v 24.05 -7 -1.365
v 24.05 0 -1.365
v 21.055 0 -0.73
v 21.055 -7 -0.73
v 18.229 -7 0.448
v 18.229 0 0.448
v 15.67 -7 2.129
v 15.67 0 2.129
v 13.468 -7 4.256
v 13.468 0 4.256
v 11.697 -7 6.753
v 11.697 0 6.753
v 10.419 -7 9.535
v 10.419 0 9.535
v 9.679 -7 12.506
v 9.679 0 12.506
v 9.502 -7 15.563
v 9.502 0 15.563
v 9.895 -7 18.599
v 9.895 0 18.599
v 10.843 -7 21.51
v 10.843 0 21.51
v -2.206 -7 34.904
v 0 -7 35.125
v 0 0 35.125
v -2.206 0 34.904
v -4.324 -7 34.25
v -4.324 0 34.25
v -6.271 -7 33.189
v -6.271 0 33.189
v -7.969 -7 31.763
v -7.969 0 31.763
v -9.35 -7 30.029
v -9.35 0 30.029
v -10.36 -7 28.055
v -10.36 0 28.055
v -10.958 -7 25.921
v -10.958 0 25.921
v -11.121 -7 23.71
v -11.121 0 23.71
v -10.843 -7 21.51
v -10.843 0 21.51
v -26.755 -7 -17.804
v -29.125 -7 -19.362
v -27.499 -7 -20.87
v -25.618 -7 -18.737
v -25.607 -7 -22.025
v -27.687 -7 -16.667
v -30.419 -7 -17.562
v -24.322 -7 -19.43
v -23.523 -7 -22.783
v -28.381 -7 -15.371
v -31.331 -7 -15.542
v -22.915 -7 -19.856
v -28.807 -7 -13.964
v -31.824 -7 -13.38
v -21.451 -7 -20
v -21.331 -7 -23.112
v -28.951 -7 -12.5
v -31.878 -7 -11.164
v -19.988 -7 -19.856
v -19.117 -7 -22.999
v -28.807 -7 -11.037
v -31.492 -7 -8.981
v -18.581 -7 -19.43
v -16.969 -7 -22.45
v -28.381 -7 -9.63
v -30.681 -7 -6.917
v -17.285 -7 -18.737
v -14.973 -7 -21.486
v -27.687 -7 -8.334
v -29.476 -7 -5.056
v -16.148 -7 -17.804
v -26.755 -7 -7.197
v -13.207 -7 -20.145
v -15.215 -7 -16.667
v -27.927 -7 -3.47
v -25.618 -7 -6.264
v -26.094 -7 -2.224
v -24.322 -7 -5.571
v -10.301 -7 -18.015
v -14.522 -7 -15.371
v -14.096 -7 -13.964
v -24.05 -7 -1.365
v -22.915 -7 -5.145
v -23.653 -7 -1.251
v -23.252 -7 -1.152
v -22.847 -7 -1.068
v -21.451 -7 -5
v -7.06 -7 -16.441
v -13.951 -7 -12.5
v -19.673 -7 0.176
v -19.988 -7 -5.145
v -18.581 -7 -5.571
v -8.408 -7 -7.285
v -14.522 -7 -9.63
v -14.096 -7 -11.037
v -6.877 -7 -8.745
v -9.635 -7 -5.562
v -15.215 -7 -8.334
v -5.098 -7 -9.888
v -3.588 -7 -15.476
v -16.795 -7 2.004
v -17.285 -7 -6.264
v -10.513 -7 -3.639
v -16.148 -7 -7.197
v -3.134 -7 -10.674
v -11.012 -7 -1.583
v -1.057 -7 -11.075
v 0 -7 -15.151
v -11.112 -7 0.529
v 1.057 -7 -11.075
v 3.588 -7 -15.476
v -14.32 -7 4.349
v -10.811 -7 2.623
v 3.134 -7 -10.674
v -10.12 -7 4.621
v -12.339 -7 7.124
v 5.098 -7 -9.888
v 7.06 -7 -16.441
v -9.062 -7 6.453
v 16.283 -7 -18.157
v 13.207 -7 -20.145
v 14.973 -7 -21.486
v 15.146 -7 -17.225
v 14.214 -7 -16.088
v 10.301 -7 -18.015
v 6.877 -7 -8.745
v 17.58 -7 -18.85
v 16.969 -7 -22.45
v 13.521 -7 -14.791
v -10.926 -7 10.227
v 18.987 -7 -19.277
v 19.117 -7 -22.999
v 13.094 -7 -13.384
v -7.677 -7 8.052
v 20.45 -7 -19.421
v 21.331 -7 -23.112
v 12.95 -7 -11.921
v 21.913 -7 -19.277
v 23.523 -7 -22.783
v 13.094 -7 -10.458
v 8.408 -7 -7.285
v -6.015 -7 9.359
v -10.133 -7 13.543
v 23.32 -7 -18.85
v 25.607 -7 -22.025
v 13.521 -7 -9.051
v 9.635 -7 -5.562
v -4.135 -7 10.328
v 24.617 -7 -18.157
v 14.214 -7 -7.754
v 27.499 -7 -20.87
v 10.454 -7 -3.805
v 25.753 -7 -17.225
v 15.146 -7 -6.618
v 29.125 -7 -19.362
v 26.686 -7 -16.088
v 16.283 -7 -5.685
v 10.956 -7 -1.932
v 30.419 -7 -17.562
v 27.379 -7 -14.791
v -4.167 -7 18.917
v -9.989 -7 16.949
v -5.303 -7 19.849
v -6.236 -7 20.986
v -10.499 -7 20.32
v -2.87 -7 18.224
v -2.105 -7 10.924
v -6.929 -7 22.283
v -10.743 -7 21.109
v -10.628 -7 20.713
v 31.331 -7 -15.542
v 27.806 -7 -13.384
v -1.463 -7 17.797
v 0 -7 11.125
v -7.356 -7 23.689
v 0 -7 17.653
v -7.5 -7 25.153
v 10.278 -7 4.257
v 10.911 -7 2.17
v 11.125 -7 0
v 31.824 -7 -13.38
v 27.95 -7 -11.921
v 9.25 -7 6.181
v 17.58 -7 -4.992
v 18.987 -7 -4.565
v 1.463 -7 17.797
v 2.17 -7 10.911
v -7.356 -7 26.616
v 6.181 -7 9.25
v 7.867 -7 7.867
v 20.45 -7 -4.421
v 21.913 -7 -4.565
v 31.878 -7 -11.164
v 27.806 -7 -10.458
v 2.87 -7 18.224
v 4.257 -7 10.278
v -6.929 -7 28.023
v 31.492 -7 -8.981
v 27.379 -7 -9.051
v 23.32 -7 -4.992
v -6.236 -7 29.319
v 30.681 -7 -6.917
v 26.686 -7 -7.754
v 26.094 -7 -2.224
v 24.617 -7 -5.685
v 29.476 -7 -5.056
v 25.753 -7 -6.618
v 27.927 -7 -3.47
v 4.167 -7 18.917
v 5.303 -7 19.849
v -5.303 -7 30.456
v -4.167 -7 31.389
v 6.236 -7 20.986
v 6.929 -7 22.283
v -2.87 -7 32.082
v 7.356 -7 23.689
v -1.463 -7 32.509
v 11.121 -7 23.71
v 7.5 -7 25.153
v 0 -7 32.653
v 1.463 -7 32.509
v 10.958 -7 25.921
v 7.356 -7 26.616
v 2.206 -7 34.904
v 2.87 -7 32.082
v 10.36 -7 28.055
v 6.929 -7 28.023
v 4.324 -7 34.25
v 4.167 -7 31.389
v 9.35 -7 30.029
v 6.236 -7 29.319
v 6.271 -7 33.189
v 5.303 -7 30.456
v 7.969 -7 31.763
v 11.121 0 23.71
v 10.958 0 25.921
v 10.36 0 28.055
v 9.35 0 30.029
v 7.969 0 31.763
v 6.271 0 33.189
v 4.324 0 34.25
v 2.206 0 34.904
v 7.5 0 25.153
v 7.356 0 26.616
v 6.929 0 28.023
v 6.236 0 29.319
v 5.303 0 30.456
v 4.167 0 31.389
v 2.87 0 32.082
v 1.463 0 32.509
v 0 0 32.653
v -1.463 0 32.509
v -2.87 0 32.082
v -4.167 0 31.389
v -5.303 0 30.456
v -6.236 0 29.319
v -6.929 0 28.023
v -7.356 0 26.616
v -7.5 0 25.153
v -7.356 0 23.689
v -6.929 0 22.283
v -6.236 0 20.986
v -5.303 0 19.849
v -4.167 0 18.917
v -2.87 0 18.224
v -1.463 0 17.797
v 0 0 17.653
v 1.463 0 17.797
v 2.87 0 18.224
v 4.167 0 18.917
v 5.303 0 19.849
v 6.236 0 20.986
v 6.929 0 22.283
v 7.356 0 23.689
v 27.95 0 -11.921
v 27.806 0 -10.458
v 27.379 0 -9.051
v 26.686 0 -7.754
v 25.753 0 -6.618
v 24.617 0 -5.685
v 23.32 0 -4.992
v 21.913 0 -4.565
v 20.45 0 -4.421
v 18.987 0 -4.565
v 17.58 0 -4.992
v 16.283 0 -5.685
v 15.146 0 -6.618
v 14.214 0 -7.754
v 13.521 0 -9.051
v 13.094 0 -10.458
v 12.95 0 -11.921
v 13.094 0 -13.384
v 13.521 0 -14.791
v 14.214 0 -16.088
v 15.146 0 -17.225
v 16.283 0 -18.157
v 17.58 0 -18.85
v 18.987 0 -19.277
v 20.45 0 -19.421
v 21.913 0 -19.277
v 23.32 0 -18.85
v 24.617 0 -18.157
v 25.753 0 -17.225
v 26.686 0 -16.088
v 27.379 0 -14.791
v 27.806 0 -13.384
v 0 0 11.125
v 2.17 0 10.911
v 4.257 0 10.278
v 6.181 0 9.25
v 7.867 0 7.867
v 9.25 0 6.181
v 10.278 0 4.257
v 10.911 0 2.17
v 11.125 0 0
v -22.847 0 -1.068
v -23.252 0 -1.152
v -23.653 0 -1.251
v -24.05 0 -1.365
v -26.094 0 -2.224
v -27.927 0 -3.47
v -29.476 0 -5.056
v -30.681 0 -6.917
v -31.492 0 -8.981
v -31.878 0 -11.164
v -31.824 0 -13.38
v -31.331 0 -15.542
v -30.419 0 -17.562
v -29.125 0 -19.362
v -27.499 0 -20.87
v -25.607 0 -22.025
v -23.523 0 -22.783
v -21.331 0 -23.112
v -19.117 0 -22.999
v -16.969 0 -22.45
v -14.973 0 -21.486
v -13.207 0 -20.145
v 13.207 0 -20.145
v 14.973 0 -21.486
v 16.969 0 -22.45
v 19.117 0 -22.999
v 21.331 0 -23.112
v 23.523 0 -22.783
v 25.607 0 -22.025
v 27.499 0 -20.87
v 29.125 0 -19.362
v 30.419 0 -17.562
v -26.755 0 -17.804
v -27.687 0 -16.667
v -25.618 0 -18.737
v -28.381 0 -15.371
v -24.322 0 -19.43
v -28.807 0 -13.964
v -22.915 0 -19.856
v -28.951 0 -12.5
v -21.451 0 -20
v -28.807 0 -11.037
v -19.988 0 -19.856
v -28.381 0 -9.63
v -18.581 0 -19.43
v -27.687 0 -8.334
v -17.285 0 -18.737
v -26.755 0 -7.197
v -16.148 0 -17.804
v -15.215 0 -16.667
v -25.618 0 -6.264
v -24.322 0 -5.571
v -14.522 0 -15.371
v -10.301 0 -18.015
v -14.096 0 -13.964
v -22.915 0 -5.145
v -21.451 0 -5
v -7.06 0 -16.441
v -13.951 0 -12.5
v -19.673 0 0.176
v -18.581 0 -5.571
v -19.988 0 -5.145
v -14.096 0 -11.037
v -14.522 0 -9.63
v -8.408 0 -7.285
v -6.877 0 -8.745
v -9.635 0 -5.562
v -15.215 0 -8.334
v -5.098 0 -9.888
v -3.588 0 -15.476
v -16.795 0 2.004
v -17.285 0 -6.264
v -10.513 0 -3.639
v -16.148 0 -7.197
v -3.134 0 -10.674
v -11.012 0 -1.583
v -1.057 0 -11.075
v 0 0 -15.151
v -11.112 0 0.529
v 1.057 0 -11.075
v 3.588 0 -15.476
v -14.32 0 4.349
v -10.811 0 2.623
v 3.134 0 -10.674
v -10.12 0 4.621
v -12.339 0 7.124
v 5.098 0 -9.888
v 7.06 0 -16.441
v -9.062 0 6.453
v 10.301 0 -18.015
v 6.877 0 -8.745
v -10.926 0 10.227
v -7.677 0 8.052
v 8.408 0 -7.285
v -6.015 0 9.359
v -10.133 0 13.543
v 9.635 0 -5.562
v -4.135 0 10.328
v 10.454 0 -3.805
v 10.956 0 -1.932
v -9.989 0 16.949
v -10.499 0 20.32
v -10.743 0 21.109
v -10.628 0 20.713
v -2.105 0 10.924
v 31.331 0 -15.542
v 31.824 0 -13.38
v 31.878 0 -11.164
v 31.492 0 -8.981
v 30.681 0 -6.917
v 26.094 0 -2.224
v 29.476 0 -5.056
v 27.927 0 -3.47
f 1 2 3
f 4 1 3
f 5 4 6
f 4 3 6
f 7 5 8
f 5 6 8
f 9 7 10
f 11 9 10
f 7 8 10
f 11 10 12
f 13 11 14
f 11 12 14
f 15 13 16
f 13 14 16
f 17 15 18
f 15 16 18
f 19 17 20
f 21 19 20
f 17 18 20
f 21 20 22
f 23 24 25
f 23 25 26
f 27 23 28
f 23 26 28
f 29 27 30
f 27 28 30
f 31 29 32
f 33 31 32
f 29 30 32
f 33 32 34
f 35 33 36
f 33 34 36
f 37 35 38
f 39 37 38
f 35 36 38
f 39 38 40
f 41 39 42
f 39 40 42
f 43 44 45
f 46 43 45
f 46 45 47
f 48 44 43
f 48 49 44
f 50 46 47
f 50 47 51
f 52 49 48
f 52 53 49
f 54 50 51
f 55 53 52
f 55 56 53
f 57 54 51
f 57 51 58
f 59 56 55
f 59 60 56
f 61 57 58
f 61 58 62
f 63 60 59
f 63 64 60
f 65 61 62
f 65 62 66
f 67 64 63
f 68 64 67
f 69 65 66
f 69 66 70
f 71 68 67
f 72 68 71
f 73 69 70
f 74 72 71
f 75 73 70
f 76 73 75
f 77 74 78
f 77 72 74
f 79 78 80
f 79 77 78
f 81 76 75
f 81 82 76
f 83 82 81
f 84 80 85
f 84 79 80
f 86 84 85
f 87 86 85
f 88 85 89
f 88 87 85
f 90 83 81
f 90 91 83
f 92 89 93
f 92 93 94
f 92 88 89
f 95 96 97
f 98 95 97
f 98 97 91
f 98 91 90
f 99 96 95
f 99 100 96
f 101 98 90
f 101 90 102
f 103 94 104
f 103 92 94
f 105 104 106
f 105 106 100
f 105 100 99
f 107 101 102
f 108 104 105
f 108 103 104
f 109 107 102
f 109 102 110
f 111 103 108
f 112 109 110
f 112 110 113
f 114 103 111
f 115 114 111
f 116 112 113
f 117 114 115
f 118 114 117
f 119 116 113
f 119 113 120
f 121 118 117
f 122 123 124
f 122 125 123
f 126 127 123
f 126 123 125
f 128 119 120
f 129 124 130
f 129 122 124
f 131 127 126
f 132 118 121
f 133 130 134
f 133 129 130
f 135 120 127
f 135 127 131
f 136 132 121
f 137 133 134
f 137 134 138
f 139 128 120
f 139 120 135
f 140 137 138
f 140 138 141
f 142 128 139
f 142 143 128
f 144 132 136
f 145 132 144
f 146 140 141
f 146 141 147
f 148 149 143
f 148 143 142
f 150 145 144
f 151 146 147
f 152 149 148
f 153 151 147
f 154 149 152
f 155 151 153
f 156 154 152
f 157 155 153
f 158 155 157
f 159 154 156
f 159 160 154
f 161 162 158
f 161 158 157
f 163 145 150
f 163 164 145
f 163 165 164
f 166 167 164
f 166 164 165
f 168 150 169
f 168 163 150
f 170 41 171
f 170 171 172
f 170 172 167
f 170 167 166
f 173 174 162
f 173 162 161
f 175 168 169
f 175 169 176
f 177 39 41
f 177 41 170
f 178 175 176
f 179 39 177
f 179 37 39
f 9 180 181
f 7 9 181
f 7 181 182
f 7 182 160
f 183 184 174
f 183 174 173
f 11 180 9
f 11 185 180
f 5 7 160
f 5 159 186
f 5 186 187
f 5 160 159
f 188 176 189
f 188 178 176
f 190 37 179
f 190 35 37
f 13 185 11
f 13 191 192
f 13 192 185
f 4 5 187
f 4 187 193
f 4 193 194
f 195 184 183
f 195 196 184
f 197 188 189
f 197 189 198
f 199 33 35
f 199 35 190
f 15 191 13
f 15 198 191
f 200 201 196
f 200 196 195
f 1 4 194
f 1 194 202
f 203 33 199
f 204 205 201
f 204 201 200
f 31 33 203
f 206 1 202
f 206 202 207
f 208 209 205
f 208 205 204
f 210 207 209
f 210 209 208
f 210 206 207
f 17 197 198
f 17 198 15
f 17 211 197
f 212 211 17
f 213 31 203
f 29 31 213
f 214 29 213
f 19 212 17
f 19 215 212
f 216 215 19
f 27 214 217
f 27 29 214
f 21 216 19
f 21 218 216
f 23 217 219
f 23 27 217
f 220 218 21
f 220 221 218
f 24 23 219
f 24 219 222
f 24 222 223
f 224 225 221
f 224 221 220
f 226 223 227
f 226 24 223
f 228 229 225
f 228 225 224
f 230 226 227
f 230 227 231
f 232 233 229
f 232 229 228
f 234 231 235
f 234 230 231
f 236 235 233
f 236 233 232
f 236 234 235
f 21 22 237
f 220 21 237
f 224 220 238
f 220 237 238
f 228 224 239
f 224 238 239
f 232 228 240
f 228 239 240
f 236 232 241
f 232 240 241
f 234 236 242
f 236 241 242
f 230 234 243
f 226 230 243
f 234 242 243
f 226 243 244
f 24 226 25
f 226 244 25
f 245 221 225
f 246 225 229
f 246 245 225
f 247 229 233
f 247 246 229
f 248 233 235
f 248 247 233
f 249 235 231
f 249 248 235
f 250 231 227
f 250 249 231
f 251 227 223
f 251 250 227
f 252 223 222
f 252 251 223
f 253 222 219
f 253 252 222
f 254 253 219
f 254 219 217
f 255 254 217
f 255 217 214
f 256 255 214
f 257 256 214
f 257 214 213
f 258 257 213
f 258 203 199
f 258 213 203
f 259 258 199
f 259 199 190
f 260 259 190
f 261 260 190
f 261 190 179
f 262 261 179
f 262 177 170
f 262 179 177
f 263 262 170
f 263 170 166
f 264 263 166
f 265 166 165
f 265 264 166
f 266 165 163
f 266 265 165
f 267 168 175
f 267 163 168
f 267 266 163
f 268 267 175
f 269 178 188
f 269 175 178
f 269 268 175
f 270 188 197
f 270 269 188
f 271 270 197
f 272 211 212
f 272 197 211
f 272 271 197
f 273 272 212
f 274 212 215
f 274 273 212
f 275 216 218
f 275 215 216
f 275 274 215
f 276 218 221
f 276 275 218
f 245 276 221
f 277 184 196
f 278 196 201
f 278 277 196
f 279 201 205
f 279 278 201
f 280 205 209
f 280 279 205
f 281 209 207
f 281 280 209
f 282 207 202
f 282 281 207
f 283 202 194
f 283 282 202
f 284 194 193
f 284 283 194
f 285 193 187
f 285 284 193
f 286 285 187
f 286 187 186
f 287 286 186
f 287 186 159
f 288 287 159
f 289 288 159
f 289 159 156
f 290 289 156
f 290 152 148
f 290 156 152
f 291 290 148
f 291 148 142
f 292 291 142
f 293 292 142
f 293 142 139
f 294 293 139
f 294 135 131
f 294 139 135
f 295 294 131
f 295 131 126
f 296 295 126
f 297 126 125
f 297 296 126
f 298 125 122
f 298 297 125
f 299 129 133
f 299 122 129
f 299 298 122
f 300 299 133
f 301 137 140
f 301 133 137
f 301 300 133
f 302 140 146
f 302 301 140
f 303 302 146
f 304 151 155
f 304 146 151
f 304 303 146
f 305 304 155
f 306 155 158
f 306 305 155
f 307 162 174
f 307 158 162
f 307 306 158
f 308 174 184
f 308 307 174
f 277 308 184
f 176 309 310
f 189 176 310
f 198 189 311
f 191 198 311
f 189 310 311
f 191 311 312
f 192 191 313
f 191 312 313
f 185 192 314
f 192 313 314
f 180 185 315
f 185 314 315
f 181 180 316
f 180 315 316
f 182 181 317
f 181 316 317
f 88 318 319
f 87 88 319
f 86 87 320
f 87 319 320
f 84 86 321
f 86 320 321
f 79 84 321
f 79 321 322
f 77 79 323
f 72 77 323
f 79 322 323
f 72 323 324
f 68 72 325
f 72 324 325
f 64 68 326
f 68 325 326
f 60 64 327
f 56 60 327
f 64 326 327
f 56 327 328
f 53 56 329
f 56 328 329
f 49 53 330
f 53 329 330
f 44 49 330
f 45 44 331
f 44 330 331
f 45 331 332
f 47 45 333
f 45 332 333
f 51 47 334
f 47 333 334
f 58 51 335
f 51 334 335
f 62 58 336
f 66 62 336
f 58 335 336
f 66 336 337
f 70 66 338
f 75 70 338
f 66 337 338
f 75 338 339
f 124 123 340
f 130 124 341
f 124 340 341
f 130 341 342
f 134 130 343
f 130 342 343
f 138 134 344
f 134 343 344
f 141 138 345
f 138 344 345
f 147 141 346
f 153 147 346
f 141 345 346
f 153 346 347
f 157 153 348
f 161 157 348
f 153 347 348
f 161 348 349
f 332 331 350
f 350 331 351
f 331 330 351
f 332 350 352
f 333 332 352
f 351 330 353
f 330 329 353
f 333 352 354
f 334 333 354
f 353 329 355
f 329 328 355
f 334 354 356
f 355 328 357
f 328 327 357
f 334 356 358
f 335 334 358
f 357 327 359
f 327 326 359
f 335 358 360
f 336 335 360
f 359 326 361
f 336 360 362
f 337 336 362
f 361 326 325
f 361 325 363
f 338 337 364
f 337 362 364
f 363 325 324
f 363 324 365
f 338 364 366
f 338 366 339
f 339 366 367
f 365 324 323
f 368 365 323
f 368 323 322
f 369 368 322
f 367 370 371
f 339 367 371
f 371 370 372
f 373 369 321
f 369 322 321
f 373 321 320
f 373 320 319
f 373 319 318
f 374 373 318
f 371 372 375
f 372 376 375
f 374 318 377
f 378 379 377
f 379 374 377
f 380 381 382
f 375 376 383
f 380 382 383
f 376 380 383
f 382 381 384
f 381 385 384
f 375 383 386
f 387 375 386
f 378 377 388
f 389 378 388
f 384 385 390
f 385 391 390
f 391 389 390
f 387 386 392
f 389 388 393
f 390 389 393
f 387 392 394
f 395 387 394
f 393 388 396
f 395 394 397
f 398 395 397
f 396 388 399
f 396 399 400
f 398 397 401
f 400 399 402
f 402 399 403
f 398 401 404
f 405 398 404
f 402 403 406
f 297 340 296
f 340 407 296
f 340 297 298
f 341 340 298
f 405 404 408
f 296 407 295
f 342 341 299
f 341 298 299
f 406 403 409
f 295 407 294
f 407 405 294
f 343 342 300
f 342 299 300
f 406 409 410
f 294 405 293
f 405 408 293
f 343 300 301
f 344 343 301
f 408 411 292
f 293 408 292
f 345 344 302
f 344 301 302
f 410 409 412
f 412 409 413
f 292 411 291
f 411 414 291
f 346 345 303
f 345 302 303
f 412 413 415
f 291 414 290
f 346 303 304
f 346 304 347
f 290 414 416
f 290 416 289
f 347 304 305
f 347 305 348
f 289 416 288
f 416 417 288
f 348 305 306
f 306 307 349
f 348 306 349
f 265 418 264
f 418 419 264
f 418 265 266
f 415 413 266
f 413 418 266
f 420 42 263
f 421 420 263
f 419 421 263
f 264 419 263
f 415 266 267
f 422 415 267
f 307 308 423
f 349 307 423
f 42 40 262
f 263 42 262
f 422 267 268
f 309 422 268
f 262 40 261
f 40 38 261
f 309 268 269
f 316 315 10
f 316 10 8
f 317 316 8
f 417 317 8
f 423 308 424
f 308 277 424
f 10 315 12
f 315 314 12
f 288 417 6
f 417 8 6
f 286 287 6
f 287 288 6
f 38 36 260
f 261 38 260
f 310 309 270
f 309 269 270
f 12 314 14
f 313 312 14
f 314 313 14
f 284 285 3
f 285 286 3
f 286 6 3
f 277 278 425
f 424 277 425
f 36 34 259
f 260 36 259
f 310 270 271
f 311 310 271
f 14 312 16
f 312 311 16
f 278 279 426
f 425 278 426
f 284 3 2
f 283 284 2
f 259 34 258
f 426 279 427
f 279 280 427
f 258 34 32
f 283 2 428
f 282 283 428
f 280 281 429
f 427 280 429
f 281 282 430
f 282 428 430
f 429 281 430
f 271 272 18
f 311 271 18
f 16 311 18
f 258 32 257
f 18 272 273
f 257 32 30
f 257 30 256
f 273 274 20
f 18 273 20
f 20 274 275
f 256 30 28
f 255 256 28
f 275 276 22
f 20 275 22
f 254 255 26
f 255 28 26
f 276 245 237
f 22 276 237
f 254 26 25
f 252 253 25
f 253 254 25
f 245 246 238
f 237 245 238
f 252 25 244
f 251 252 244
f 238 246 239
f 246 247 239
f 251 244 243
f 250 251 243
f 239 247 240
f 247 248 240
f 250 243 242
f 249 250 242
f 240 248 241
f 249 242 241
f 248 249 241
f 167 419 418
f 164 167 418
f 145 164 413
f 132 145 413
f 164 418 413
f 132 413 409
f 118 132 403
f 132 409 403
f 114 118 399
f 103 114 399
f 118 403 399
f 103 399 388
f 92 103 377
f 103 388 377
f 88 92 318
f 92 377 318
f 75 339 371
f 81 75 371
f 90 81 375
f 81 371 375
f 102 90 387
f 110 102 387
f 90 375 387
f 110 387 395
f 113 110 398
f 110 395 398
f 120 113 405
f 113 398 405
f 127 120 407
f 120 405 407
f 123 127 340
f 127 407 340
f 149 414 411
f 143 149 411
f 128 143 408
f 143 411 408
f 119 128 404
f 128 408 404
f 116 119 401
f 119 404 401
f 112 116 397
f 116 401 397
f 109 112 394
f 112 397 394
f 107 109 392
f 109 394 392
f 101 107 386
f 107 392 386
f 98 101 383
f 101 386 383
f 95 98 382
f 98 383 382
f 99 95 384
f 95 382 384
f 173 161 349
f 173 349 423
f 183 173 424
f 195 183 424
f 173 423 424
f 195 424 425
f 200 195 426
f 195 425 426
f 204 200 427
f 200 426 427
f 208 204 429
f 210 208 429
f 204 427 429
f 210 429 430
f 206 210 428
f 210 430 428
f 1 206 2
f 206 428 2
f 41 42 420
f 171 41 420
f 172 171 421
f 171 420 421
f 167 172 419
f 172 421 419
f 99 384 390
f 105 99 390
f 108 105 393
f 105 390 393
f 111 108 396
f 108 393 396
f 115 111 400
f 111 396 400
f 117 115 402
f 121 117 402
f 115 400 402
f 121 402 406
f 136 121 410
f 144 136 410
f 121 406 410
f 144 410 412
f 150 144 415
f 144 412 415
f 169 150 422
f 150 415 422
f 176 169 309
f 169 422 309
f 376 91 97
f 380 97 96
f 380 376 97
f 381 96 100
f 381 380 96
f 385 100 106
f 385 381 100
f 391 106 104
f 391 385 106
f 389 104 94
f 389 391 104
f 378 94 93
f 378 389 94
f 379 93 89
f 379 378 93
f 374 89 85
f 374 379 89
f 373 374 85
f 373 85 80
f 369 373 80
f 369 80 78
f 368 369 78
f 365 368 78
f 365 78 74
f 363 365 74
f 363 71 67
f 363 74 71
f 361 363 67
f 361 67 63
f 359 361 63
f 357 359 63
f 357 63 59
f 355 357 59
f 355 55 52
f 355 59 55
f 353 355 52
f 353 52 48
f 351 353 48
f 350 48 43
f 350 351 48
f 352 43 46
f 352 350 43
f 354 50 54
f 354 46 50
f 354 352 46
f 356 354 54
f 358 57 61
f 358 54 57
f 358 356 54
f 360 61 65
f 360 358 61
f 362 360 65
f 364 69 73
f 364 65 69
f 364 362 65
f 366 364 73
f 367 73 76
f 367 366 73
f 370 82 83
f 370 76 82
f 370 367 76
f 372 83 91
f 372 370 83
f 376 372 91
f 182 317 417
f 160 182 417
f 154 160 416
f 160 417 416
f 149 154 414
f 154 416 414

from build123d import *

# Parameters (mm, degrees)
F1_DEPTH = 7
F2_R     = 7.5
F3_DEPTH = 47.6


with BuildPart() as f1:
    # F0 (on Front) → F1 (new body)
    with BuildSketch(Plane.XZ):
        with BuildLine():
            ThreePointArc((0, 11.125), (7.866563, 7.866563), (11.125, 0))
            ThreePointArc((11.125, 0), (10.745925, -2.879362), (9.634533, -5.5625))
            Line((9.634533, -5.5625), (30.419142, -17.5625))
            ThreePointArc((30.419142, -17.5625), (31.137901, -7.928761), (24.049755, -1.364942))
            ThreePointArc((24.049755, -1.364942), (11.696795, 6.753148), (10.842803, 21.51017))
            ThreePointArc((10.842803, 21.51017), (8.702442, 30.930594), (0, 35.125))
            Line((0, 35.125), (0, 11.125))
        make_face()
        with BuildLine():
            ThreePointArc((-9.634533, -5.5625), (-9.634533, 5.5625), (0, 11.125))
            Line((0, 11.125), (0, 35.125))
            ThreePointArc((0, 35.125), (-8.702442, 30.930594), (-10.842803, 21.51017))
            ThreePointArc((-10.842803, 21.51017), (-10.660456, 20.918313), (-10.498883, 20.32045))
            ThreePointArc((-10.498883, 20.32045), (-12.339117, 7.123992), (-22.847468, -1.067926))
            ThreePointArc((-22.847468, -1.067926), (-23.446018, -1.226931), (-24.049755, -1.364942))
            ThreePointArc((-24.049755, -1.364942), (-31.137901, -7.928761), (-30.419142, -17.5625))
            Line((-30.419142, -17.5625), (-9.634533, -5.5625))
        make_face()
        with BuildLine():
            Line((30.419142, -17.5625), (9.634533, -5.5625))
            ThreePointArc((9.634533, -5.5625), (0, -11.125), (-9.634533, -5.5625))
            Line((-9.634533, -5.5625), (-30.419142, -17.5625))
            ThreePointArc((-30.419142, -17.5625), (-22.435459, -23.001833), (-13.206952, -20.145228))
            ThreePointArc((-13.206952, -20.145228), (0, -15.150958), (13.206952, -20.145228))
            ThreePointArc((13.206952, -20.145228), (22.435459, -23.001833), (30.419142, -17.5625))
        make_face()
        with BuildLine():
            ThreePointArc((-10.498883, 20.32045), (-10.660456, 20.918313), (-10.842803, 21.51017))
            ThreePointArc((-10.842803, 21.51017), (-10.68741, 20.910521), (-10.498883, 20.32045))
        make_face()
        with BuildLine():
            ThreePointArc((-22.847468, -1.067926), (-23.452747, -1.199691), (-24.049755, -1.364942))
            ThreePointArc((-24.049755, -1.364942), (-23.446018, -1.226931), (-22.847468, -1.067926))
        make_face()
    extrude(amount=F1_DEPTH)

    # F2 (on Front) → F3 (cut)
    with BuildSketch(Plane.XZ):
        with Locations((20.449737, -11.921206)):
            Circle(F2_R)
        with Locations((-21.451427, -12.500484)):
            Circle(F2_R)
        with Locations((0, 25.152633)):
            Circle(F2_R)
    extrude(amount=F3_DEPTH, mode=Mode.SUBTRACT)


solid = f1.part
